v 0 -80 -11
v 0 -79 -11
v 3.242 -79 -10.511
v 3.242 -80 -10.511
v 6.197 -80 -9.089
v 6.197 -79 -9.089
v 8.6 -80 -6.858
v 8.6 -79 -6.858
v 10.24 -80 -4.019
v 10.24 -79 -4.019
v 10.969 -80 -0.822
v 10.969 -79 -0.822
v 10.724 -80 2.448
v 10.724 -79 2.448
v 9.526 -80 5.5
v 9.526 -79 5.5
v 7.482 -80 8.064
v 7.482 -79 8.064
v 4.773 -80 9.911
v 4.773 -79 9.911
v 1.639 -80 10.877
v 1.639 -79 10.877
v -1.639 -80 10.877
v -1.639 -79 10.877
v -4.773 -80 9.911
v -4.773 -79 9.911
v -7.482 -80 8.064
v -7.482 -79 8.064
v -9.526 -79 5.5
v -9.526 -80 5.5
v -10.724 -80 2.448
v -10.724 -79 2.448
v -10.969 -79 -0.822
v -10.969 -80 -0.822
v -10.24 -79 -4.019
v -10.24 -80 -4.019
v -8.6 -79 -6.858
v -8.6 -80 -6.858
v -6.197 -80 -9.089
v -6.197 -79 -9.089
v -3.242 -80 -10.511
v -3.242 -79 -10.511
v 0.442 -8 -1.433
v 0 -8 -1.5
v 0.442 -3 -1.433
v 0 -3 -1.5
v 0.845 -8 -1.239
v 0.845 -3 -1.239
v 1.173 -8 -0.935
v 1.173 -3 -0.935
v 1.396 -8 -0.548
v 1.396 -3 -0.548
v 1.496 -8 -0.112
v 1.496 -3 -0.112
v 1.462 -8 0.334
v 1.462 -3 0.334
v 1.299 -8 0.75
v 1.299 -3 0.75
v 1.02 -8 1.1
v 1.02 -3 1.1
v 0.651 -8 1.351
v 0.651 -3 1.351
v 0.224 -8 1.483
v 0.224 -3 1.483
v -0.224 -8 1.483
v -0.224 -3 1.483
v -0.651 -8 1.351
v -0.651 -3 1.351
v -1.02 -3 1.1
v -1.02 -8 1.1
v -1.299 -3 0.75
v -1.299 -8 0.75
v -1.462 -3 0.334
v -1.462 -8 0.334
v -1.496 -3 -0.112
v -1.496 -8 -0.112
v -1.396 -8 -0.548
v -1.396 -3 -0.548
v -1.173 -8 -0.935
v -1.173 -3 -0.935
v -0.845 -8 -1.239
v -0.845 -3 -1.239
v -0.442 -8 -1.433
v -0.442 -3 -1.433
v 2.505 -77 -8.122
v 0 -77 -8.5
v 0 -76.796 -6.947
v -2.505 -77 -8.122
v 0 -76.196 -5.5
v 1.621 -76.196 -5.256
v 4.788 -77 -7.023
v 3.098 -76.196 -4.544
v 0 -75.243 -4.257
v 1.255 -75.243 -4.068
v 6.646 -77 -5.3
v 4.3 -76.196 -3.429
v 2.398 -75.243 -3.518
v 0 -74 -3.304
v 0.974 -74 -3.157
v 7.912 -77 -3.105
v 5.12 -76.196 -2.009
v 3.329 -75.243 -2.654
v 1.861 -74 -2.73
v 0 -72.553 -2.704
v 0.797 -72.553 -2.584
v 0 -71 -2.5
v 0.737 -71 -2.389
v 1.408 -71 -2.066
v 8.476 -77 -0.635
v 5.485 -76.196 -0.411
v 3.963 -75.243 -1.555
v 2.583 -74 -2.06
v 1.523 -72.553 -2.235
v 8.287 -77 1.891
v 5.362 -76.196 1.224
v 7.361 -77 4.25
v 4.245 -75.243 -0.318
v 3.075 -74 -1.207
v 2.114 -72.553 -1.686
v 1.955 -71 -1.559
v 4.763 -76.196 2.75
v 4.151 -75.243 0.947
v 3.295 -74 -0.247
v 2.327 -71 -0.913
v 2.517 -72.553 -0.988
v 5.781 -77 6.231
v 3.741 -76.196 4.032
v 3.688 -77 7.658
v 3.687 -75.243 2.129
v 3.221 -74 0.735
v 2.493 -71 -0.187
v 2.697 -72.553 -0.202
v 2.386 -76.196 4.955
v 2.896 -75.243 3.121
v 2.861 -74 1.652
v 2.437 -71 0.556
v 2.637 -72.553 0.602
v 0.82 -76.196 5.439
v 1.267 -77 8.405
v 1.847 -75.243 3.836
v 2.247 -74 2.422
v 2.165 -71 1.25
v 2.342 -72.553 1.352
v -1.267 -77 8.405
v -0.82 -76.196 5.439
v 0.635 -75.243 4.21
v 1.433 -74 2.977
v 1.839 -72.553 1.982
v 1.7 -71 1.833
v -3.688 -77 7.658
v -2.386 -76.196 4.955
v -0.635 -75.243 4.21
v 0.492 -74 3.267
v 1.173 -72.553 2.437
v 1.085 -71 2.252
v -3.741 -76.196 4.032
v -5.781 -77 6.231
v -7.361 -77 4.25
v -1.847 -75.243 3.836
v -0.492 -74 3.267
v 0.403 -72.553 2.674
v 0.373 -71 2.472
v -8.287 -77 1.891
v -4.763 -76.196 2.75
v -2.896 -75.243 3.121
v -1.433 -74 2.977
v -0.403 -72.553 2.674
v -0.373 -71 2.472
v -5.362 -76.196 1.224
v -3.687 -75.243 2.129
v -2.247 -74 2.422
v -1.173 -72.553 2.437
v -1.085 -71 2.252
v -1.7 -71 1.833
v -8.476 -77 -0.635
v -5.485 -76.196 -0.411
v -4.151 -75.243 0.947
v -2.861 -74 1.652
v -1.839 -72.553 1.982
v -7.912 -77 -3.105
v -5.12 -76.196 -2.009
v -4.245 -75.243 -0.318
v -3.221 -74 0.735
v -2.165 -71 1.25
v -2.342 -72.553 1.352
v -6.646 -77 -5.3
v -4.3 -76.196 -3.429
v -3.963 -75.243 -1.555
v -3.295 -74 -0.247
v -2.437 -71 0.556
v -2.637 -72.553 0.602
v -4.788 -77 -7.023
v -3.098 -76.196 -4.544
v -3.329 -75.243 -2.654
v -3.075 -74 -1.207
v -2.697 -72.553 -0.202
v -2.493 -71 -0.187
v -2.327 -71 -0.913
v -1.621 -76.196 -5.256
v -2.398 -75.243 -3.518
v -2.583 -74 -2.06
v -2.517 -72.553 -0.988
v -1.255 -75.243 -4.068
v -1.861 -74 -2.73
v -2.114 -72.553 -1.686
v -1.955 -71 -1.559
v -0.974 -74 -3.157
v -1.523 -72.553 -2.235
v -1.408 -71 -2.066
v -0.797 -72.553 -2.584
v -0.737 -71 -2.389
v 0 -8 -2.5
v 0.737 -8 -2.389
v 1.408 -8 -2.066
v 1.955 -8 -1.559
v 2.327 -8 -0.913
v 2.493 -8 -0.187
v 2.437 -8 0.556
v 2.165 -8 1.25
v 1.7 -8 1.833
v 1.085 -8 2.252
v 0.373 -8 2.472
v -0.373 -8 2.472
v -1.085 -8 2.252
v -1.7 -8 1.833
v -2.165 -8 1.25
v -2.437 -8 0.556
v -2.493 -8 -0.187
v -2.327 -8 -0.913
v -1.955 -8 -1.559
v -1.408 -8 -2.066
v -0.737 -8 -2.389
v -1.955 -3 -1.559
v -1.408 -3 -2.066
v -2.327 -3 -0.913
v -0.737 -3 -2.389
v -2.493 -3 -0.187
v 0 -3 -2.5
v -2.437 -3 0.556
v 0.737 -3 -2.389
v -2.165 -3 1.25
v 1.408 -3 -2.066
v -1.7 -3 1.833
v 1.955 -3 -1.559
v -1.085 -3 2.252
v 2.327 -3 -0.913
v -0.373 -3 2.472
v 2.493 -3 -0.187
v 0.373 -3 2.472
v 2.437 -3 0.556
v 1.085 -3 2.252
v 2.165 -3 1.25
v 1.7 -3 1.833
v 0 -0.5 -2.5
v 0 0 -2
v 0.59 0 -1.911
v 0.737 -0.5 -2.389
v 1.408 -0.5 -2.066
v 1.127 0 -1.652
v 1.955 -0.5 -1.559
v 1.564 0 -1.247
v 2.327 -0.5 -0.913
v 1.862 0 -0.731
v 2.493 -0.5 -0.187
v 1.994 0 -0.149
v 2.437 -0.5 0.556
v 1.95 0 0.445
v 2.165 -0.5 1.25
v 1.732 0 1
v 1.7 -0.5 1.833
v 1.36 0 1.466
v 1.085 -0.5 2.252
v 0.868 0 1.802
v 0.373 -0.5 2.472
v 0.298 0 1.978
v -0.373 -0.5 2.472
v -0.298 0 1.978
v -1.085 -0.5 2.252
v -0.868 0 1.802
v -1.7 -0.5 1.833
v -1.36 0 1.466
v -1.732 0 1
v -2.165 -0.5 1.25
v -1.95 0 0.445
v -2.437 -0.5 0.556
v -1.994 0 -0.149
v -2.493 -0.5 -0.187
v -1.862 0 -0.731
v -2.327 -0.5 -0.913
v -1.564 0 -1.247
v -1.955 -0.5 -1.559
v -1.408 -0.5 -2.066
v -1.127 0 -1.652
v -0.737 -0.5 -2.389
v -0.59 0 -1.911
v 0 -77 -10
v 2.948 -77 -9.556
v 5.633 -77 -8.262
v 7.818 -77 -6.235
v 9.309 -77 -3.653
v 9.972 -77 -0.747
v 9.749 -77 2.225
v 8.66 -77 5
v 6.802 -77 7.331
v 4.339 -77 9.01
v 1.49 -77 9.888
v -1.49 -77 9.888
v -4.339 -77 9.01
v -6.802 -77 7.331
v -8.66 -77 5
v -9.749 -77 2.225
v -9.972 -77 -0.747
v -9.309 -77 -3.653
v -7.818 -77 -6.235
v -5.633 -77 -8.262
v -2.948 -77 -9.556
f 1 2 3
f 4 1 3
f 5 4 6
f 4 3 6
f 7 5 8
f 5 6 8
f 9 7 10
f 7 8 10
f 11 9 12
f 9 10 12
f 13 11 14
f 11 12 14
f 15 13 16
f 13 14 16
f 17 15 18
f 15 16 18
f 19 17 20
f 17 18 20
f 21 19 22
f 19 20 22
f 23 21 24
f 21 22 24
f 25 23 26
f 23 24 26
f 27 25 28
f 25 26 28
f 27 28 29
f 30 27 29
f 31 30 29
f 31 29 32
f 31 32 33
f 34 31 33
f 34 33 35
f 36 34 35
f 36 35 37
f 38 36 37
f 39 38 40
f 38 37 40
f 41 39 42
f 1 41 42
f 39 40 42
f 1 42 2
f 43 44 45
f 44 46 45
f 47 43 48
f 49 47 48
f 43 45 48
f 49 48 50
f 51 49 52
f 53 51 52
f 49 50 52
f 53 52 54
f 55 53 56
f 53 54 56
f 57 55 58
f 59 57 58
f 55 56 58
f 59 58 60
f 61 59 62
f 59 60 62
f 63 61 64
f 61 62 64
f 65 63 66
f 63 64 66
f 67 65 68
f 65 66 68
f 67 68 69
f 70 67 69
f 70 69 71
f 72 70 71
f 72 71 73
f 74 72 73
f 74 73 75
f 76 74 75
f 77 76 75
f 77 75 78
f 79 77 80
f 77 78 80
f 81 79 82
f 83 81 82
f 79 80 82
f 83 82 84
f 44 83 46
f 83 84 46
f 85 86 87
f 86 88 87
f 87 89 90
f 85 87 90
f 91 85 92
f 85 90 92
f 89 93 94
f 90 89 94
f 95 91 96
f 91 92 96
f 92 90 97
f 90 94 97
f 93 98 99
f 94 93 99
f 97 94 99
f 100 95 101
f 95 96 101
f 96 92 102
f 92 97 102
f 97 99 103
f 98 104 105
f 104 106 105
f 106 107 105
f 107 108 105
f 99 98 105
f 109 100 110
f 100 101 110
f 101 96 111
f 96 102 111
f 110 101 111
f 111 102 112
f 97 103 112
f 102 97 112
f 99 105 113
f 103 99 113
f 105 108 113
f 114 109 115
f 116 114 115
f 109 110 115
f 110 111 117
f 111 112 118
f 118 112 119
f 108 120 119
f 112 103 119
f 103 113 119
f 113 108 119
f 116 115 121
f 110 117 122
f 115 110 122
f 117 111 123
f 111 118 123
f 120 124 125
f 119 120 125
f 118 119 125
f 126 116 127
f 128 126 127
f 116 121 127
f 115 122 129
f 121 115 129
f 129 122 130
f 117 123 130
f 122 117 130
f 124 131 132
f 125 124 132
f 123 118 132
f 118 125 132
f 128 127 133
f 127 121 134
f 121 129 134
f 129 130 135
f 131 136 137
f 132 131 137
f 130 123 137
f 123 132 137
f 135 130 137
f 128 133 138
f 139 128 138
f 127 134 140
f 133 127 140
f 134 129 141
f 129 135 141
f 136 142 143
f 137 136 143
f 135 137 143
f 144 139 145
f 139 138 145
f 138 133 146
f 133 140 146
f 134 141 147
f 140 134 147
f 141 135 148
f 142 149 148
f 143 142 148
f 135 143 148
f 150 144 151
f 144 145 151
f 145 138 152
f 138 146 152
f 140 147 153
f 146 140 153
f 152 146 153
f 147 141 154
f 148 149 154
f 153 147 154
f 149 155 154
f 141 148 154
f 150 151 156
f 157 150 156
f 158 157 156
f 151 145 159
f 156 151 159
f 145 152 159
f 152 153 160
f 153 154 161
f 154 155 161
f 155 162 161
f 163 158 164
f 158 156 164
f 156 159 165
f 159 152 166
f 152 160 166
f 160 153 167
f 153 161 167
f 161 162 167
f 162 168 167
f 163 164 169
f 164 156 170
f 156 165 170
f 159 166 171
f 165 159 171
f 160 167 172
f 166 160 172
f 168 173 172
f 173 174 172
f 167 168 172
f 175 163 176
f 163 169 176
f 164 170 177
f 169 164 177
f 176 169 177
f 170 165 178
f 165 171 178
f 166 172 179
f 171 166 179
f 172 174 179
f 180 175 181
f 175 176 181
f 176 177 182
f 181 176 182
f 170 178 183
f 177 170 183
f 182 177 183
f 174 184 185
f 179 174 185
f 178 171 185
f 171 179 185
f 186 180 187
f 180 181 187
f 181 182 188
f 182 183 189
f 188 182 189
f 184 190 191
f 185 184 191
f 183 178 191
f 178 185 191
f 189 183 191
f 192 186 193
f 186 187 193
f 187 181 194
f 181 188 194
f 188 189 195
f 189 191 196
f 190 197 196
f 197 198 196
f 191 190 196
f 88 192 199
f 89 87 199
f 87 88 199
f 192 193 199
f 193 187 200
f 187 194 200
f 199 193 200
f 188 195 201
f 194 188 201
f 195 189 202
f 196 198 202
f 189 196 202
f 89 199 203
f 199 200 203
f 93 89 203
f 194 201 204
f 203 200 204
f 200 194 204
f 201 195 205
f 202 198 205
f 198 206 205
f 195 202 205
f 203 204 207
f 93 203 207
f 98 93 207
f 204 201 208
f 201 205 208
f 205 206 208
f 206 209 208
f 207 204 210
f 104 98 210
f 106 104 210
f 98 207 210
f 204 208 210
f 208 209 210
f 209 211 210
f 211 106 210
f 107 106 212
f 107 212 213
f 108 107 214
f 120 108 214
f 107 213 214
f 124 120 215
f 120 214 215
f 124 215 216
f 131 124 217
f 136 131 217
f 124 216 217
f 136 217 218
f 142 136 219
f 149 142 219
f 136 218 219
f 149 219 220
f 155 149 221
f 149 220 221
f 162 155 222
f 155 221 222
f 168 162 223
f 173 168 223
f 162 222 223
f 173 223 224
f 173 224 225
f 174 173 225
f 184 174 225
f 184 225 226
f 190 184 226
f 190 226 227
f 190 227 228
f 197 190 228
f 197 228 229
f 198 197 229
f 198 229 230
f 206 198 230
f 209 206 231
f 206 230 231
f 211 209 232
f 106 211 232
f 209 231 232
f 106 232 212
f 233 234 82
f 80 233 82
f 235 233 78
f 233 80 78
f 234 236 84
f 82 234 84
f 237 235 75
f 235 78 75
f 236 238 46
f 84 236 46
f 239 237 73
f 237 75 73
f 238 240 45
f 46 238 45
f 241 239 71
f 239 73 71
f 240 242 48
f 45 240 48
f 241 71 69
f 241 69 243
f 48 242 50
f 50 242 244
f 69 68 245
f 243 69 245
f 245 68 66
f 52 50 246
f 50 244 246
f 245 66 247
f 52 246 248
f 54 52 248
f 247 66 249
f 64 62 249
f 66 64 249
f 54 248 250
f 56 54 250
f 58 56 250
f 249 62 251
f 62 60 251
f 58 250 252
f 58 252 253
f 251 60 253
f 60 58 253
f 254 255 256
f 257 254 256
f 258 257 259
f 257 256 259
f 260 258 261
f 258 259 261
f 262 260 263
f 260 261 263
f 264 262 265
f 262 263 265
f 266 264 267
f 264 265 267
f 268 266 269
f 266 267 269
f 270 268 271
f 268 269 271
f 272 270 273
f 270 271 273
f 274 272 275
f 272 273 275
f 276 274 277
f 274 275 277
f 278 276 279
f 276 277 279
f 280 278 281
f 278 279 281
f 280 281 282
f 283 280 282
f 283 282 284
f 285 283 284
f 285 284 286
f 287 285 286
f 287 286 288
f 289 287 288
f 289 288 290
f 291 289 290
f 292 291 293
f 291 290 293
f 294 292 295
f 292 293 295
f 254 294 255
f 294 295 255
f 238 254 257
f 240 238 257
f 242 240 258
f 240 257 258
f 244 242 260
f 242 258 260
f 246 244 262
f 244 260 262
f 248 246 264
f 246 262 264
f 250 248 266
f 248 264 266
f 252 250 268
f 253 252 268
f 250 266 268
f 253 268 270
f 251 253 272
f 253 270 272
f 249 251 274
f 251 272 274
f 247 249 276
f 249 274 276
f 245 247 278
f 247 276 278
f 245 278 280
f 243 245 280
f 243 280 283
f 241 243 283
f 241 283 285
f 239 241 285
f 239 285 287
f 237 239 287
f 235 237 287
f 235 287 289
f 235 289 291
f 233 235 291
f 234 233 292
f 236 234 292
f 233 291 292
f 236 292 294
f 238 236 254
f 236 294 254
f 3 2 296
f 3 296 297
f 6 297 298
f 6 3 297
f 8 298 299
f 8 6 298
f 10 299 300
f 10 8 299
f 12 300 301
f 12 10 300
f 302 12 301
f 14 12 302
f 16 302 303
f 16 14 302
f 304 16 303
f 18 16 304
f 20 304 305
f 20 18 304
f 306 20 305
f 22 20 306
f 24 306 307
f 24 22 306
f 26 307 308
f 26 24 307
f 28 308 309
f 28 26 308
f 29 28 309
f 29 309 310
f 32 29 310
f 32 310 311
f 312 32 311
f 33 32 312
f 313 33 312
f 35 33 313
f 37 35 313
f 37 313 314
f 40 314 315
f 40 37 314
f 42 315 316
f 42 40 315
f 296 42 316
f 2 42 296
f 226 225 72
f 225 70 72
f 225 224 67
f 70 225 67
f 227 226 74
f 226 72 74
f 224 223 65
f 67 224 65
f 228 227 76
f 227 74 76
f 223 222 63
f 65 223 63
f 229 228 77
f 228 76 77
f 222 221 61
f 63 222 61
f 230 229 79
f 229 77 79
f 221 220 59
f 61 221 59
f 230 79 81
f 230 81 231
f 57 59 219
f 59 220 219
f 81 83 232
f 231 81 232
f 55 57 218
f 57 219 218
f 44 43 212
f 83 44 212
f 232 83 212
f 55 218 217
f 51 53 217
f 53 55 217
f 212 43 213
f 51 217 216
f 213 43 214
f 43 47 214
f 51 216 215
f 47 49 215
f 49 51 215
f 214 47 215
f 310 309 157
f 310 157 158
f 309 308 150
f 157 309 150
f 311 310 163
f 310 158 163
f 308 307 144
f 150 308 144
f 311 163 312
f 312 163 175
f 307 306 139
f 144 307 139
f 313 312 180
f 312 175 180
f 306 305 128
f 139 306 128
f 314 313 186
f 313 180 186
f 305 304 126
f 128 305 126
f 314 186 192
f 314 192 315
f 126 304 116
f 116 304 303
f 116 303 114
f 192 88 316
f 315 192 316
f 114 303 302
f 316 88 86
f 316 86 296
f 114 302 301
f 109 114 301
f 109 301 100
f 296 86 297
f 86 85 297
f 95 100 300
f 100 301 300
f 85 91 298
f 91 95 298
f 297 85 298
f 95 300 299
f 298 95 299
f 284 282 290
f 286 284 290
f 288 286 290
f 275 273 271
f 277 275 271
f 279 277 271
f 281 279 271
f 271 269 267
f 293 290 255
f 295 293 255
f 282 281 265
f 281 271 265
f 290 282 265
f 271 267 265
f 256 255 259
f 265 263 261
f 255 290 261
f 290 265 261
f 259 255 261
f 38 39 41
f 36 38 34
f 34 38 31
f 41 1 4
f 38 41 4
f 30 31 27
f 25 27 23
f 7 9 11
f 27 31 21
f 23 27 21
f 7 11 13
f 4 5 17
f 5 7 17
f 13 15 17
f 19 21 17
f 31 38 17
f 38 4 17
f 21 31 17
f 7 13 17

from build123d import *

# Parameters (mm, degrees)
FILLET1_R      = 6
CHAMFER1_SIZE  = 1
CHAMFER1_SIZE2 = 2
CHAMFER2_SIZE  = 0.5


with BuildPart() as part:
    # Sketch1 → Revolve1 (revolve)
    with BuildSketch(Plane(origin=(0, 0, 0), x_dir=(0, 0, -1), z_dir=(1, 0, 0))):
        Polygon((0, 0), (0, -80), (11, -80), (11, -77), (2.5, -77), (2.5, -8), (1.5, -8), (1.5, -3), (2.5, -3), (2.5, 0), align=None)
    revolve(axis=Axis((0, 0, 0), (0, -1, 0)))

    # Fillet1
    fillet1_edges = [part.edges().sort_by_distance(p)[0] for p in [
        (0, -77, 2.5),
    ]]
    fillet(fillet1_edges, radius=FILLET1_R)

    # Chamfer1
    chamfer1_edges = [part.edges().sort_by_distance(p)[0] for p in [
        (0, -77, 11),
    ]]
    chamfer1_side = [part.faces().sort_by_distance(p)[0] for p in [
        (0, -77, 8.811126984),
    ]]
    chamfer(chamfer1_edges, length=CHAMFER1_SIZE, length2=CHAMFER1_SIZE2, reference=chamfer1_side[0])

    # Chamfer2
    chamfer2_edges = [part.edges().sort_by_distance(p)[0] for p in [
        (0, 0, 2.5),
    ]]
    chamfer(chamfer2_edges, length=CHAMFER2_SIZE)


solid = part.part
